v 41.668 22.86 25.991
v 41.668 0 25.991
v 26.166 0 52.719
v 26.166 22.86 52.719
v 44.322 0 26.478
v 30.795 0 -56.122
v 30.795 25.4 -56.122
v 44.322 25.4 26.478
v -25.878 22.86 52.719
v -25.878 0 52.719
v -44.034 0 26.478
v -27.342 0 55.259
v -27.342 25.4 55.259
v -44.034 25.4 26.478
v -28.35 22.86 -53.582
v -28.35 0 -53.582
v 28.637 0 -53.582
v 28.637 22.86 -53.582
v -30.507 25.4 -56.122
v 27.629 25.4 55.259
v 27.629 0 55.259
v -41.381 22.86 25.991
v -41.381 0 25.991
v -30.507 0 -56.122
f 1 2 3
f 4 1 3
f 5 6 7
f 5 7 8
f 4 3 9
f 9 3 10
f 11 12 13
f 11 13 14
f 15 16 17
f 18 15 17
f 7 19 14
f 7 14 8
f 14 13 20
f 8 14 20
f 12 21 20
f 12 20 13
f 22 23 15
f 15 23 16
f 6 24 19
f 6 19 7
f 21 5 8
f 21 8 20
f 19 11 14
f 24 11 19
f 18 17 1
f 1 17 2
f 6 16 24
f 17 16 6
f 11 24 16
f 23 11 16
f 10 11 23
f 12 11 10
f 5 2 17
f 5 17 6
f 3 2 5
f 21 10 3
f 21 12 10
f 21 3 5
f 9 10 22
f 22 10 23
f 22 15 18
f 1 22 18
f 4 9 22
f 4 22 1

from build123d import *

# Parameters (mm, degrees)
F2_DEPTH = 25.4
F3_T     = -2.54


with BuildPart() as f2:
    # F0 (on Front) → F2 (new body)
    with BuildSketch(Plane.XZ):
        Polygon((27.629351, 55.258706), (-27.341546, 55.258706), (-44.03428, 26.478129), (-30.50741, -56.122124), (30.795213, -56.122124), (44.322088, 26.478129), align=None)
    extrude(amount=-F2_DEPTH)

    # F3
    f3_openings = [f2.faces().sort_by_distance(p)[0] for p in [
        (0.143903, 0, 0.698193),
    ]]
    offset(amount=F3_T, openings=f3_openings)


solid = f2.part
